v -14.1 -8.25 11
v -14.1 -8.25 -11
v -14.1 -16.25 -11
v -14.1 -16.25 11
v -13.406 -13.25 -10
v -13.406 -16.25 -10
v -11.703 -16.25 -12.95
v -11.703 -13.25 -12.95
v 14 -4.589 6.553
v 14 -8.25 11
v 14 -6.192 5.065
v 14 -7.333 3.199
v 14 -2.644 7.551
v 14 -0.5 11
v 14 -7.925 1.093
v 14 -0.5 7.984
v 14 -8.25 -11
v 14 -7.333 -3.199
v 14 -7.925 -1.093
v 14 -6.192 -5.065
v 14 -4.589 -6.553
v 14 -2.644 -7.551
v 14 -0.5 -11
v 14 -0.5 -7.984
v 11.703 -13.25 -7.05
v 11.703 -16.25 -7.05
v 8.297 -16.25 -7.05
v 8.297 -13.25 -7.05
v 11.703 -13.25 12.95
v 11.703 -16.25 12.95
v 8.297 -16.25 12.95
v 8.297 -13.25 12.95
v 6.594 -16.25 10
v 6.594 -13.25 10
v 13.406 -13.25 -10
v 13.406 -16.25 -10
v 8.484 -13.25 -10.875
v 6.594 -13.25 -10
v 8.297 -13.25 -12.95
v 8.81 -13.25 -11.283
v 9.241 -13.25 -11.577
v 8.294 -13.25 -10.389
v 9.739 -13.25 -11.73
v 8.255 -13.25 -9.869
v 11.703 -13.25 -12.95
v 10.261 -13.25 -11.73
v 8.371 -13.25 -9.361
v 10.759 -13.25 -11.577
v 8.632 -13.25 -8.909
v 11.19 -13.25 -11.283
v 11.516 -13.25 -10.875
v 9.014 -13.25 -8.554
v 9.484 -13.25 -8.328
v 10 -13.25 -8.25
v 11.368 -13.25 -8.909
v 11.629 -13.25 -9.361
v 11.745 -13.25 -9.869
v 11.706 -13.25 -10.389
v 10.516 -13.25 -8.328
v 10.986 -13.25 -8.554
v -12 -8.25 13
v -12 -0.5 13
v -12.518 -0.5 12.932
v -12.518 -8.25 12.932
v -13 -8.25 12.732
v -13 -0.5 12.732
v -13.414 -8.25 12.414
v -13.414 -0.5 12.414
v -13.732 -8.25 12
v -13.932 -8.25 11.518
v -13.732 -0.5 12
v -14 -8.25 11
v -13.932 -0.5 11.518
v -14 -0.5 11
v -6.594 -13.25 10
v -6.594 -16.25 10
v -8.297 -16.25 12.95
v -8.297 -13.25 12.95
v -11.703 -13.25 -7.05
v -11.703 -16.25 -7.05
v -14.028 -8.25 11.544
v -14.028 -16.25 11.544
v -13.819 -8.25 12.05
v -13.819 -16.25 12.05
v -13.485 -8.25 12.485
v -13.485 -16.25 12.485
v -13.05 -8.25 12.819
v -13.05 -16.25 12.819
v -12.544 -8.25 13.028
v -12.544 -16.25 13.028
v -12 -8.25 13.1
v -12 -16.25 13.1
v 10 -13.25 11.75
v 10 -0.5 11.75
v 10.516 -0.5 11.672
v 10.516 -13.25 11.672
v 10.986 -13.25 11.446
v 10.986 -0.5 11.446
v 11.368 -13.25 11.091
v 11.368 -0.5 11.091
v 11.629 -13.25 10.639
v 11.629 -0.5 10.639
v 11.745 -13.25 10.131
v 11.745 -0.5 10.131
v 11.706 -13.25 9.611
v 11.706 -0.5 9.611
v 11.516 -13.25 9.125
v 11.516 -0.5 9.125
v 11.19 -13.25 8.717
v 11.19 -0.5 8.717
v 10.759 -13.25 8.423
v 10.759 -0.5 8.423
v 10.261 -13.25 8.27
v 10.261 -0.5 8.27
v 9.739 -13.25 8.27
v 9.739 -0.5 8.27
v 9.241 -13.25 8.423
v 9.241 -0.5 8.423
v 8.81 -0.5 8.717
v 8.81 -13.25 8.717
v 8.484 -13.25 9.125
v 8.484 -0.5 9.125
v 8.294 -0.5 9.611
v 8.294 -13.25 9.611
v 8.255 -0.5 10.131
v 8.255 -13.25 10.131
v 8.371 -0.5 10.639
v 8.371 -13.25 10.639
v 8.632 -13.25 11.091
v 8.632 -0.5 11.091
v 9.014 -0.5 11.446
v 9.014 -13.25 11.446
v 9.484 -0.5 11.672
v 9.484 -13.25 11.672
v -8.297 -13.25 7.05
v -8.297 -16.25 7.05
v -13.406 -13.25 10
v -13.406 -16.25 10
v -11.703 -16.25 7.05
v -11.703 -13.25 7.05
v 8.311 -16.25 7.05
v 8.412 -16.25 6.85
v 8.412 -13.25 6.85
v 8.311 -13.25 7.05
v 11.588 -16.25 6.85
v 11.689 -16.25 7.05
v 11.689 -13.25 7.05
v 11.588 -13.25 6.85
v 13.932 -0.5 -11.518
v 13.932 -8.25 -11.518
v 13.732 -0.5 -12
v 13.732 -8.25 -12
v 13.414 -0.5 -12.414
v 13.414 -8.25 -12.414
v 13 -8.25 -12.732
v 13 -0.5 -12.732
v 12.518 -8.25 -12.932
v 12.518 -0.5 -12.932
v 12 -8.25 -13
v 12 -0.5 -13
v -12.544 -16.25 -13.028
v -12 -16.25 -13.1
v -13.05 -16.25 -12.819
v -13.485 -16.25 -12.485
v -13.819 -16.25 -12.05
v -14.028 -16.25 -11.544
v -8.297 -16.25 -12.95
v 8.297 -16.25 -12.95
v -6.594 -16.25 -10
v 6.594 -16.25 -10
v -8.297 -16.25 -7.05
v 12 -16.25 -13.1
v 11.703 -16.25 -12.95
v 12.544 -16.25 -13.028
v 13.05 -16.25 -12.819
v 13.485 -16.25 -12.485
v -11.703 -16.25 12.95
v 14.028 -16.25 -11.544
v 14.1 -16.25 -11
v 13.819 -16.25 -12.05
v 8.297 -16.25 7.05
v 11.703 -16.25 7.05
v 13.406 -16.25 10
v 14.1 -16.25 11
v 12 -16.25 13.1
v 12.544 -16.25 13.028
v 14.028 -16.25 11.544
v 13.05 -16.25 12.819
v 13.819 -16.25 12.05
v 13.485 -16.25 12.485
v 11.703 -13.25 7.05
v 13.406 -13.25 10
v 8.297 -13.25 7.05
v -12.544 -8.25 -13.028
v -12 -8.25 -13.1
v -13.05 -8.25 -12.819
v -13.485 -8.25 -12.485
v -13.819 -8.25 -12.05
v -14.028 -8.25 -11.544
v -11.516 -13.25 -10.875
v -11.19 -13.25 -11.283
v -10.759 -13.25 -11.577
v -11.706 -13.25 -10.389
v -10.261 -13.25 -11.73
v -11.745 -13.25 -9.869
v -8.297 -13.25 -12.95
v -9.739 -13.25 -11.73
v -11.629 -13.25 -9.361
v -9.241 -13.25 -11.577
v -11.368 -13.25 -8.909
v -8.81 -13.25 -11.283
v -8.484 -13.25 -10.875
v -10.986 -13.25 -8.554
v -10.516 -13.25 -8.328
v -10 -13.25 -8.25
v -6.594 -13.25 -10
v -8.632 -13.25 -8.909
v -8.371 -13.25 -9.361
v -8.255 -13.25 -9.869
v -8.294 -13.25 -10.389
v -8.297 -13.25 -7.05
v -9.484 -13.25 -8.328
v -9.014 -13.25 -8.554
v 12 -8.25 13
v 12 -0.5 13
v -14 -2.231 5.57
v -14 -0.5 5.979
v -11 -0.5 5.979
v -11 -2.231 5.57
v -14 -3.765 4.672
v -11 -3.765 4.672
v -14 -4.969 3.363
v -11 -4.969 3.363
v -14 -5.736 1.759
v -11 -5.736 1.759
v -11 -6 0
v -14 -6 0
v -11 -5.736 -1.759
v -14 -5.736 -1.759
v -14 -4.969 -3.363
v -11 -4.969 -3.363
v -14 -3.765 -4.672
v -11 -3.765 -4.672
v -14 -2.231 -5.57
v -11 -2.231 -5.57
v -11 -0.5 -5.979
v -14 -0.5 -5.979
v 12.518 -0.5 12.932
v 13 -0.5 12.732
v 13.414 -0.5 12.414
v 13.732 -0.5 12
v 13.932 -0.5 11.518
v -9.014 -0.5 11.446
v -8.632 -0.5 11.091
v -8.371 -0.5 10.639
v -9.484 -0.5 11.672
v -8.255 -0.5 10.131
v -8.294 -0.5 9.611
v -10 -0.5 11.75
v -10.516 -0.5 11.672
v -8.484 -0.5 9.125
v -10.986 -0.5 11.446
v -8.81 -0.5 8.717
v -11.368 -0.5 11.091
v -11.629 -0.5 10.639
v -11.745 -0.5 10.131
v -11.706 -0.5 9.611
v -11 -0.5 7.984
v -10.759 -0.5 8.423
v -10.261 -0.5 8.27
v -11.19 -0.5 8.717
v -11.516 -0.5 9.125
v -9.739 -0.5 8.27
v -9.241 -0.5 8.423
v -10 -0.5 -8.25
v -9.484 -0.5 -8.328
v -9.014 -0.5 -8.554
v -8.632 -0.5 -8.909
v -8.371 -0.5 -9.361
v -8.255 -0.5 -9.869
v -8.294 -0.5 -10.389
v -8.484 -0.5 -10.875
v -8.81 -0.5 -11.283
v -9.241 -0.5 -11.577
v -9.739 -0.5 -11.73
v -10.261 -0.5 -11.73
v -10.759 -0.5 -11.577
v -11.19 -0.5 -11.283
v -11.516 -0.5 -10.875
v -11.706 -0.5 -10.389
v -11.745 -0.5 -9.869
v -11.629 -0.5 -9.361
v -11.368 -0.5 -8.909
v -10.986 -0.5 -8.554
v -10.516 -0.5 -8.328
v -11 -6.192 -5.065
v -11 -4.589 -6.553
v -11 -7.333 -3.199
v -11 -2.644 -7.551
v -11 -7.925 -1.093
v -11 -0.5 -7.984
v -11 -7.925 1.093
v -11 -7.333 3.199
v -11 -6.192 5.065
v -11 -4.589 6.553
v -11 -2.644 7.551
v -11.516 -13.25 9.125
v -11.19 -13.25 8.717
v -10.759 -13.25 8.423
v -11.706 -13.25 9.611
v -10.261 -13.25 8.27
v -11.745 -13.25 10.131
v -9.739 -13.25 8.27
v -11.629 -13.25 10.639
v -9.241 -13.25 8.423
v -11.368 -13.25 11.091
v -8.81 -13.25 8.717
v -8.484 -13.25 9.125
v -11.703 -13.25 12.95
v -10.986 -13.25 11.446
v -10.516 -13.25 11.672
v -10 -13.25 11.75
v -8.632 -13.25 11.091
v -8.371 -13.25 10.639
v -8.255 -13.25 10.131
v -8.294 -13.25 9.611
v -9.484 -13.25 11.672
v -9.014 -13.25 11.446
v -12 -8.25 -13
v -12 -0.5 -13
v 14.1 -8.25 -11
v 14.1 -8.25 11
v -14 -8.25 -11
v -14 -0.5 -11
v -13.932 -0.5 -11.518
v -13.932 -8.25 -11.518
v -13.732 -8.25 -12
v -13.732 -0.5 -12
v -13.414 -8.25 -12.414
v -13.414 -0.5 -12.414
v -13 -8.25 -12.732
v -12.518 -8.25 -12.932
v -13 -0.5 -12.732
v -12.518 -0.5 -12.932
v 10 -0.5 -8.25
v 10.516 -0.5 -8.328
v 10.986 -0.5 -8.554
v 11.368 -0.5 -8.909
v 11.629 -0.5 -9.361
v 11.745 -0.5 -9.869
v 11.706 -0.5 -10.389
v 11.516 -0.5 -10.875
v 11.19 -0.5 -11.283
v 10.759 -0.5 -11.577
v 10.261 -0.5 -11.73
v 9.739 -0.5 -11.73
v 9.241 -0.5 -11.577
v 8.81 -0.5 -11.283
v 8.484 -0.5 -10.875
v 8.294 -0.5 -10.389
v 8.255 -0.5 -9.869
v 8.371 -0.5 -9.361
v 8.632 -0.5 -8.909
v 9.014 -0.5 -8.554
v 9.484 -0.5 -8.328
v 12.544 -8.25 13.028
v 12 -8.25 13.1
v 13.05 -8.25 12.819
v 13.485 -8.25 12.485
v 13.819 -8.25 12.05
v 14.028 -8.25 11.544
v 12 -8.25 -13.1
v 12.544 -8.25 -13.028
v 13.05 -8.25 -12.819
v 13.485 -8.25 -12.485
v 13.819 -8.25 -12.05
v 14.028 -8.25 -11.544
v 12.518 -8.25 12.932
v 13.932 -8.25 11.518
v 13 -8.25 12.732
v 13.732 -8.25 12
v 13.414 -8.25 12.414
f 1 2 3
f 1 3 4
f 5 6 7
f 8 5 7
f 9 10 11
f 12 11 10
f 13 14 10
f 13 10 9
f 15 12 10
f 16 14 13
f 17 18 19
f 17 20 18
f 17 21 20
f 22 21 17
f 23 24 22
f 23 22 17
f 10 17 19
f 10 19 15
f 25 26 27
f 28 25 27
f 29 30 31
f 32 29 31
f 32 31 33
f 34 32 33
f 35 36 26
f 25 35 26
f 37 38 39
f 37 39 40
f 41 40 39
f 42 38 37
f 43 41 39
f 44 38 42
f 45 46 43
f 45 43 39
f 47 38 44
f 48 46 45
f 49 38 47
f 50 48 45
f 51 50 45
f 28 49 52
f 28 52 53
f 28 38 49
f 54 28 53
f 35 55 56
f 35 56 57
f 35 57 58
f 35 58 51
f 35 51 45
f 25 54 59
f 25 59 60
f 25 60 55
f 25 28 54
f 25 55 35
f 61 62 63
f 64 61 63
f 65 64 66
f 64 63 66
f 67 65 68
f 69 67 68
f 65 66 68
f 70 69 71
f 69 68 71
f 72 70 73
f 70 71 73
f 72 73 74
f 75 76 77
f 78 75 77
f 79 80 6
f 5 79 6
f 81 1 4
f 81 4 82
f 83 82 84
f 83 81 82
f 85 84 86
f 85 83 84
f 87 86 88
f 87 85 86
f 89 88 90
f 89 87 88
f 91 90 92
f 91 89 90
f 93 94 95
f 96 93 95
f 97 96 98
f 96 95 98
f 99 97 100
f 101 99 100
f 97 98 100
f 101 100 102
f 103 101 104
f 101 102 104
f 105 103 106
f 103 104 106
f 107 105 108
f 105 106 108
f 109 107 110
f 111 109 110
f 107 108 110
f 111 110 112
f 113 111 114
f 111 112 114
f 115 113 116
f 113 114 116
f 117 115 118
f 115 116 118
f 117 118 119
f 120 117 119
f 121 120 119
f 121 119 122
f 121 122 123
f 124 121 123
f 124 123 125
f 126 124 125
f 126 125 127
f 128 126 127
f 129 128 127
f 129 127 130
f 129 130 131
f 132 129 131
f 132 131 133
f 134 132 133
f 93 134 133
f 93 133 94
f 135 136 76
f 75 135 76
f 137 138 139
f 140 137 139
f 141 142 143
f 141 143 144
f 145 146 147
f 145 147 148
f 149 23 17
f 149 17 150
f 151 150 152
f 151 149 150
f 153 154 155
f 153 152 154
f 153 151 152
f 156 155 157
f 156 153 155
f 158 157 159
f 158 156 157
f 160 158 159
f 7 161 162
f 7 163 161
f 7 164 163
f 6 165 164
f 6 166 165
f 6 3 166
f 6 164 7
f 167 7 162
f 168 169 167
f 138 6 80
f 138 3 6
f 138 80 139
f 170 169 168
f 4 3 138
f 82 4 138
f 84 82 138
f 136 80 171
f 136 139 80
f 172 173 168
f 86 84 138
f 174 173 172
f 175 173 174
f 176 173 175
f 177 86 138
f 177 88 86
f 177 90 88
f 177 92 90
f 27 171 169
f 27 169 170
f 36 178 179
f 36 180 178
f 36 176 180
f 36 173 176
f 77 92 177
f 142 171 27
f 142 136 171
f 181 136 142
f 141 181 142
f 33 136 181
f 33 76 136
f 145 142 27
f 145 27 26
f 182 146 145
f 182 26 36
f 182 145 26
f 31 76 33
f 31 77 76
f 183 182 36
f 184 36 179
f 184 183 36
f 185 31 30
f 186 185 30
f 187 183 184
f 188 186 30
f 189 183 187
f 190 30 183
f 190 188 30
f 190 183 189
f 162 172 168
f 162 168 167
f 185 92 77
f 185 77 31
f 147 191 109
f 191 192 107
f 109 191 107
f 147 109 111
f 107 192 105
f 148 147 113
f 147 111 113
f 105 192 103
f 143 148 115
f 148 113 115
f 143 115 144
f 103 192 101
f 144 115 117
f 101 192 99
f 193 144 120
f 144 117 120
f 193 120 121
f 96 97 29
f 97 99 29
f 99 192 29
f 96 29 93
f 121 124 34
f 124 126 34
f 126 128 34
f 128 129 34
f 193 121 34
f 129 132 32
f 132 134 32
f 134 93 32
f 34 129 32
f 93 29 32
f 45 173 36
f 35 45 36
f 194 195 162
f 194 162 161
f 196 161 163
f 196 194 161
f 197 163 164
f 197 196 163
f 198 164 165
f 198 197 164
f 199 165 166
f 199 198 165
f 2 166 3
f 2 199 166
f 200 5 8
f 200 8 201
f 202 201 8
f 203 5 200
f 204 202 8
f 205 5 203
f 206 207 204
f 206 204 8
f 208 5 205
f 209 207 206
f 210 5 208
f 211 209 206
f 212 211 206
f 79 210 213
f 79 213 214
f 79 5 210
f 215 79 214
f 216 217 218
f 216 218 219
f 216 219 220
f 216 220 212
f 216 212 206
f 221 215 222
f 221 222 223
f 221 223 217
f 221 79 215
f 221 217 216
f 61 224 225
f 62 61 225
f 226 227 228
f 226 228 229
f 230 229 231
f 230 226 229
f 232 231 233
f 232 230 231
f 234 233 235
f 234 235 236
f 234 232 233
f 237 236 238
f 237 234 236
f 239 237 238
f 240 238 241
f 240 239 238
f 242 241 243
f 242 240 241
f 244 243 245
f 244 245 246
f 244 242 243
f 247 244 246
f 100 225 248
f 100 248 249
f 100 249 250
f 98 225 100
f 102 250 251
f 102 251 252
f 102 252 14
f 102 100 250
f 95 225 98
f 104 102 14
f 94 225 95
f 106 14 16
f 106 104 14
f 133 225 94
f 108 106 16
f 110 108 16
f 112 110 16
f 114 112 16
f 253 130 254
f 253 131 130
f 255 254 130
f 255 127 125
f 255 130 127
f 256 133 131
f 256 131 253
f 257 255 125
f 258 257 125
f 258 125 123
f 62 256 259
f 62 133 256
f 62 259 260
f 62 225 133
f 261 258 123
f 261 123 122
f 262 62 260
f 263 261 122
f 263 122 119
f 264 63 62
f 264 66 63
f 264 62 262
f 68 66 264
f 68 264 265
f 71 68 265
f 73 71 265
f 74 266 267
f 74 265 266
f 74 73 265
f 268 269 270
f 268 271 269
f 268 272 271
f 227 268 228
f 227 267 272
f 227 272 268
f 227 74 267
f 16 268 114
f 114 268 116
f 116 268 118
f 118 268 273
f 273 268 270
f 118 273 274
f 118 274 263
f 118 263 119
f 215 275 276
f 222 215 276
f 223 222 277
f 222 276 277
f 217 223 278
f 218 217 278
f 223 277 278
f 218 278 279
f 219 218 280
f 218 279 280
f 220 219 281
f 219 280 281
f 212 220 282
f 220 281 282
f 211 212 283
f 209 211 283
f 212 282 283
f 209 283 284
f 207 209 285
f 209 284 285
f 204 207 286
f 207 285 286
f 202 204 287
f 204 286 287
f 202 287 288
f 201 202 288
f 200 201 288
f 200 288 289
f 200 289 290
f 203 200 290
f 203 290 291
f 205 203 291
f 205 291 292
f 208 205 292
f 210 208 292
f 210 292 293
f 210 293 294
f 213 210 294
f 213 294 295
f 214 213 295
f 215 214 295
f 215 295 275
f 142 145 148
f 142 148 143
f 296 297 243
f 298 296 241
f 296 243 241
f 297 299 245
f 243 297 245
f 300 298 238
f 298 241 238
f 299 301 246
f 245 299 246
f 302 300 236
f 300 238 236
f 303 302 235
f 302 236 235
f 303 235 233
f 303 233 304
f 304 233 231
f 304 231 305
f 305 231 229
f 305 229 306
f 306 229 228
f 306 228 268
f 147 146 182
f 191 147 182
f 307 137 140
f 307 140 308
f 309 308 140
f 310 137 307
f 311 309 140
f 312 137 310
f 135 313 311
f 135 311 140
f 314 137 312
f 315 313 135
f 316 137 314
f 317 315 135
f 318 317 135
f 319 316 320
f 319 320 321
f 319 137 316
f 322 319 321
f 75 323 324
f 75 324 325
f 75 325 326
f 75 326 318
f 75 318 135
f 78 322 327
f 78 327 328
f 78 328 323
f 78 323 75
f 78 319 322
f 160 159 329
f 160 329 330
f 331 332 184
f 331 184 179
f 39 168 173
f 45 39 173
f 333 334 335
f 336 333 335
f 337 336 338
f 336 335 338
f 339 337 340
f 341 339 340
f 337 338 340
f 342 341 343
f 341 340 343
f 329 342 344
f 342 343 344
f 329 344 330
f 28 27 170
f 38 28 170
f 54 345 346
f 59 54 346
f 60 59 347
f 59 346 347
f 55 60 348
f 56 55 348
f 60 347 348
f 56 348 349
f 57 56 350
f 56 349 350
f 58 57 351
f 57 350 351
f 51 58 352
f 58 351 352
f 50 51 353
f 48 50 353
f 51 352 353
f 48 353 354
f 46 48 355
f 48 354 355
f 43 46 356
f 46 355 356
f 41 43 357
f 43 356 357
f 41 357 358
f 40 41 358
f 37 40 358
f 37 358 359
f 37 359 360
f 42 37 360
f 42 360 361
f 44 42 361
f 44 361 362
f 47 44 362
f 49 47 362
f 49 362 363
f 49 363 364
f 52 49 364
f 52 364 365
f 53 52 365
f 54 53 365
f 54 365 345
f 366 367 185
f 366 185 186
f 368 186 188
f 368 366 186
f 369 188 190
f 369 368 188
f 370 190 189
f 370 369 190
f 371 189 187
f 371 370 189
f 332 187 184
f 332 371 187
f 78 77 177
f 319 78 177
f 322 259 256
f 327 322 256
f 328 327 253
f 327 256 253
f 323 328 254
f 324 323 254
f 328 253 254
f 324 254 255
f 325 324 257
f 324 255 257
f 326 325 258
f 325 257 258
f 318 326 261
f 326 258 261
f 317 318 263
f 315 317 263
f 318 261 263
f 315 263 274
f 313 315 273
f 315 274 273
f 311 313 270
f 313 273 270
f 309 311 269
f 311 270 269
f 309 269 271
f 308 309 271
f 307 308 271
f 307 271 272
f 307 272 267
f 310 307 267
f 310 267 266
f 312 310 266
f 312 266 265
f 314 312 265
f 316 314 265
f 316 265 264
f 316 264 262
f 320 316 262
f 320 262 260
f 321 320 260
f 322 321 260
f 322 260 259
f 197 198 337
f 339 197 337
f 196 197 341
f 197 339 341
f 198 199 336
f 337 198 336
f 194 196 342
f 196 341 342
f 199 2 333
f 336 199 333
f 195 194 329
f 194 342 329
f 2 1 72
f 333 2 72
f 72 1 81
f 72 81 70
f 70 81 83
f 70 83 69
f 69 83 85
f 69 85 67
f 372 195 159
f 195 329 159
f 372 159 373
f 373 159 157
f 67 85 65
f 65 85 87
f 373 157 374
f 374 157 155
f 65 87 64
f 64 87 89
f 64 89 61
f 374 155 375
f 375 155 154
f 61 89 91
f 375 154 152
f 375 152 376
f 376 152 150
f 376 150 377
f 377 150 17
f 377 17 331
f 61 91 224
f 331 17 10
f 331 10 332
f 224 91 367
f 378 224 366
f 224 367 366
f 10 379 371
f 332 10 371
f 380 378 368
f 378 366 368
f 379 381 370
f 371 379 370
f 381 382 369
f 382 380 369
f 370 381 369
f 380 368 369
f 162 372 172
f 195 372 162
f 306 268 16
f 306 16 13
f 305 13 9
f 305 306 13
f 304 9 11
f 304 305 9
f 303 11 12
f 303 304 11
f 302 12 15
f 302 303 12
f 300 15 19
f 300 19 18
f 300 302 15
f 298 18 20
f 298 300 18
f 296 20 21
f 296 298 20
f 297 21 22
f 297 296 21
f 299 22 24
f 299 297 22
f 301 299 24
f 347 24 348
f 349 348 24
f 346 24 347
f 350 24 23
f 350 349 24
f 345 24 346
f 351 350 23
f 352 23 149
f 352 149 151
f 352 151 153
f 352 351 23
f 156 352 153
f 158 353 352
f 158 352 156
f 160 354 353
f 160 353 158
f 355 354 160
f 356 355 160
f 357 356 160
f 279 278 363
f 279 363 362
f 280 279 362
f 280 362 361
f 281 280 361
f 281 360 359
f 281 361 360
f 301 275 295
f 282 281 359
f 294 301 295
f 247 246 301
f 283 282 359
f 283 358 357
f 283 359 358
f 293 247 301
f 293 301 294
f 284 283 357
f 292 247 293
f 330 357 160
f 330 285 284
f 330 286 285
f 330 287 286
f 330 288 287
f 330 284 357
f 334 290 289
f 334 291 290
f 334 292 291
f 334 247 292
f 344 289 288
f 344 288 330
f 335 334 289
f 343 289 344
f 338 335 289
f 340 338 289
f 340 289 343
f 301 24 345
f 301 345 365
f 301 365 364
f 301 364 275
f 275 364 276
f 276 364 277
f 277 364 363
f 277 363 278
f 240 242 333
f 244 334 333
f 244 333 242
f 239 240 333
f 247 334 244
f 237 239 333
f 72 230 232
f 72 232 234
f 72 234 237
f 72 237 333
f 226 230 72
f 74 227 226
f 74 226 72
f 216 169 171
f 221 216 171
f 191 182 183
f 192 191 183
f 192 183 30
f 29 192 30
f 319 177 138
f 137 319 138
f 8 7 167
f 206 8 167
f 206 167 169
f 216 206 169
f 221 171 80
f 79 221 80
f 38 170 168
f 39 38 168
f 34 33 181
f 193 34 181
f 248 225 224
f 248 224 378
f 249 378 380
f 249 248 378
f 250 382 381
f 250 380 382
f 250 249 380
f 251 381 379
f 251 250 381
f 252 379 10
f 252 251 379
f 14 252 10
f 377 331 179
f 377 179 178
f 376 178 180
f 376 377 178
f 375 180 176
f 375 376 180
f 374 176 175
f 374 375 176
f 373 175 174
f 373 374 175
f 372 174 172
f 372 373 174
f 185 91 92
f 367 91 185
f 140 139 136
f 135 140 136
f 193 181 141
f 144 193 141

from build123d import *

# Parameters (mm, degrees)
SKETCH1_W           = 26
SKETCH1_H           = 32.5
SKETCH1_R           = 8
BOSS_EXTRUDE1_DEPTH = 14
SKETCH2_R           = 1.75
CUT_EXTRUDE1_DEPTH  = 72
SKETCH3_W           = 26
SKETCH3_H           = 16.75
CUT_EXTRUDE3_DEPTH  = 32
FILLET2_R           = 2
BOSS_EXTRUDE2_DEPTH = 3
CUT_EXTRUDE4_DEPTH  = 3
BOSS_EXTRUDE3_DEPTH = 8
CUT_EXTRUDE5_DEPTH  = 3
CUT_EXTRUDE6_DEPTH  = 25.010414407


with BuildPart() as part:
    # Sketch1 → Boss-Extrude1 (new, symmetric)
    with BuildSketch(Plane(origin=(0, 0, 0), x_dir=(0, 0, -1), z_dir=(1, 0, 0))):
        Rectangle(SKETCH1_W, SKETCH1_H)
        Circle(SKETCH1_R, mode=Mode.SUBTRACT)
    extrude(amount=BOSS_EXTRUDE1_DEPTH, both=True)

    # Sketch2 → Cut-Extrude1 (cut)
    with BuildSketch(Plane(origin=(0, 16.25, 0), x_dir=(1, 0, 0), z_dir=(0, 1, 0))):
        with Locations(Location((-10, 10, 0), (0, 0, 270))):
            Circle(SKETCH2_R)
        with Locations(Location((10, 10, 0), (0, 0, 270))):
            Circle(SKETCH2_R)
        with Locations(Location((10, -10, 0), (0, 0, 270))):
            Circle(SKETCH2_R)
        with Locations(Location((-10, -10, 0), (0, 0, 270))):
            Circle(SKETCH2_R)
    extrude(amount=-CUT_EXTRUDE1_DEPTH, mode=Mode.SUBTRACT)

    # Sketch3 → Cut-Extrude3 (cut)
    with BuildSketch(Plane.ZY.offset(14)):
        with Locations((0, 7.875)):
            Rectangle(SKETCH3_W, SKETCH3_H)
    extrude(amount=-CUT_EXTRUDE3_DEPTH, mode=Mode.SUBTRACT)

    # Fillet2
    fillet2_edges = [part.edges().sort_by_distance(p)[0] for p in [
        (-14, -8.375, 13),
        (14, -8.375, 13),
        (14, -8.375, -13),
        (-14, -8.375, -13),
    ]]
    fillet(fillet2_edges, radius=FILLET2_R)

    # Sketch4 → Boss-Extrude2 (add)
    with BuildSketch(Plane(origin=(-14, 0, 0), x_dir=(0, 0, -1), z_dir=(1, 0, 0))):
        with BuildLine():
            Line((-7.984359711, -0.5), (-5.979130372, -0.5))
            ThreePointArc((-5.979130372, -0.5), (0, -6), (5.979130372, -0.5))
            Line((5.979130372, -0.5), (7.984359711, -0.5))
            ThreePointArc((7.984359711, -0.5), (0, -8), (-7.984359711, -0.5))
        make_face()
    extrude(amount=BOSS_EXTRUDE2_DEPTH)

    # Sketch5 → Cut-Extrude4 (cut)
    with BuildSketch(Plane.XZ.offset(16.25)):
        Polygon((-6.593633412, 10), (-8.296816706, 12.95), (-11.703183294, 12.95), (-13.406366588, 10), (-11.703183294, 7.05), (-8.296816706, 7.05), align=None)
        Polygon((8.41228676, 6.85), (6.824573519, 10), (8.41228676, 12.75), (11.58771324, 12.75), (13.175426481, 10), (11.58771324, 6.85), align=None)
        Polygon((6.824573519, -10), (8.41228676, -12.75), (11.58771324, -12.75), (13.175426481, -10), (11.58771324, -7.25), (8.41228676, -7.25), align=None)
        Polygon((-8.41228676, -7.25), (-6.824573519, -10), (-8.41228676, -12.75), (-11.58771324, -12.75), (-13.175426481, -10), (-11.58771324, -7.25), align=None)
    extrude(amount=-CUT_EXTRUDE4_DEPTH, mode=Mode.SUBTRACT)

    # Sketch6 → Boss-Extrude3 (add)
    with BuildSketch(Plane.XZ.offset(16.25)):
        with BuildLine():
            Line((-12, -15.5), (12, -15.5))
            ThreePointArc((12, -15.5), (15.181980515, -14.181980515), (16.5, -11))
            Line((16.5, -11), (16.5, 11))
            ThreePointArc((16.5, 11), (15.181980515, 14.181980515), (12, 15.5))
            Line((12, 15.5), (-12, 15.5))
            ThreePointArc((-12, 15.5), (-15.181980515, 14.181980515), (-16.5, 11))
            Line((-16.5, 11), (-16.5, -11))
            ThreePointArc((-16.5, -11), (-15.181980515, -14.181980515), (-12, -15.5))
        make_face()
        with BuildLine():
            Line((-12, -13), (12, -13))
            ThreePointArc((12, -13), (13.414213562, -12.414213562), (14, -11))
            Line((14, -11), (14, 11))
            ThreePointArc((14, 11), (13.414213562, 12.414213562), (12, 13))
            Line((12, 13), (-12, 13))
            ThreePointArc((-12, 13), (-13.414213562, 12.414213562), (-14, 11))
            Line((-14, 11), (-14, -11))
            ThreePointArc((-14, -11), (-13.414213562, -12.414213562), (-12, -13))
        make_face(mode=Mode.SUBTRACT)
    extrude(amount=-BOSS_EXTRUDE3_DEPTH)

    # Sketch7 → Cut-Extrude5 (cut)
    with BuildSketch(Plane.XZ.offset(16.25)):
        Polygon((-6.593633412, 10), (-8.296816706, 12.95), (-11.703183294, 12.95), (-13.406366588, 10), (-11.703183294, 7.05), (-8.296816706, 7.05), align=None)
        Polygon((13.406366588, 10), (11.703183294, 12.95), (8.296816706, 12.95), (6.593633412, 10), (8.296816706, 7.05), (11.703183294, 7.05), align=None)
        Polygon((-6.593633412, -10), (-8.296816706, -7.05), (-11.703183294, -7.05), (-13.406366588, -10), (-11.703183294, -12.95), (-8.296816706, -12.95), align=None)
        Polygon((13.406366588, -10), (11.703183294, -7.05), (8.296816706, -7.05), (6.593633412, -10), (8.296816706, -12.95), (11.703183294, -12.95), align=None)
    extrude(amount=-CUT_EXTRUDE5_DEPTH, mode=Mode.SUBTRACT)

    # Sketch8 → Cut-Extrude6 (cut, through all)
    with BuildSketch(Plane(origin=(0, -8.25, 0), x_dir=(1, 0, 0), z_dir=(0, 1, 0))):
        with BuildLine():
            Line((-12, -15.7), (12, -15.7))
            ThreePointArc((12, -15.7), (15.323401872, -14.323401872), (16.7, -11))
            Line((16.7, -11), (16.7, 11))
            ThreePointArc((16.7, 11), (15.323401872, 14.323401872), (12, 15.7))
            Line((12, 15.7), (-12, 15.7))
            ThreePointArc((-12, 15.7), (-15.323401872, 14.323401872), (-16.7, 11))
            Line((-16.7, 11), (-16.7, -11))
            ThreePointArc((-16.7, -11), (-15.323401872, -14.323401872), (-12, -15.7))
        make_face()
        with BuildLine():
            Line((-14.1, 11), (-14.1, -11))
            ThreePointArc((-14.1, -11), (-13.48492424, -12.48492424), (-12, -13.1))
            Line((-12, -13.1), (12, -13.1))
            ThreePointArc((12, -13.1), (13.48492424, -12.48492424), (14.1, -11))
            Line((14.1, -11), (14.1, 11))
            ThreePointArc((14.1, 11), (13.48492424, 12.48492424), (12, 13.1))
            Line((12, 13.1), (-12, 13.1))
            ThreePointArc((-12, 13.1), (-13.48492424, 12.48492424), (-14.1, 11))
        make_face(mode=Mode.SUBTRACT)
    extrude(amount=-CUT_EXTRUDE6_DEPTH, mode=Mode.SUBTRACT)


solid = part.part
